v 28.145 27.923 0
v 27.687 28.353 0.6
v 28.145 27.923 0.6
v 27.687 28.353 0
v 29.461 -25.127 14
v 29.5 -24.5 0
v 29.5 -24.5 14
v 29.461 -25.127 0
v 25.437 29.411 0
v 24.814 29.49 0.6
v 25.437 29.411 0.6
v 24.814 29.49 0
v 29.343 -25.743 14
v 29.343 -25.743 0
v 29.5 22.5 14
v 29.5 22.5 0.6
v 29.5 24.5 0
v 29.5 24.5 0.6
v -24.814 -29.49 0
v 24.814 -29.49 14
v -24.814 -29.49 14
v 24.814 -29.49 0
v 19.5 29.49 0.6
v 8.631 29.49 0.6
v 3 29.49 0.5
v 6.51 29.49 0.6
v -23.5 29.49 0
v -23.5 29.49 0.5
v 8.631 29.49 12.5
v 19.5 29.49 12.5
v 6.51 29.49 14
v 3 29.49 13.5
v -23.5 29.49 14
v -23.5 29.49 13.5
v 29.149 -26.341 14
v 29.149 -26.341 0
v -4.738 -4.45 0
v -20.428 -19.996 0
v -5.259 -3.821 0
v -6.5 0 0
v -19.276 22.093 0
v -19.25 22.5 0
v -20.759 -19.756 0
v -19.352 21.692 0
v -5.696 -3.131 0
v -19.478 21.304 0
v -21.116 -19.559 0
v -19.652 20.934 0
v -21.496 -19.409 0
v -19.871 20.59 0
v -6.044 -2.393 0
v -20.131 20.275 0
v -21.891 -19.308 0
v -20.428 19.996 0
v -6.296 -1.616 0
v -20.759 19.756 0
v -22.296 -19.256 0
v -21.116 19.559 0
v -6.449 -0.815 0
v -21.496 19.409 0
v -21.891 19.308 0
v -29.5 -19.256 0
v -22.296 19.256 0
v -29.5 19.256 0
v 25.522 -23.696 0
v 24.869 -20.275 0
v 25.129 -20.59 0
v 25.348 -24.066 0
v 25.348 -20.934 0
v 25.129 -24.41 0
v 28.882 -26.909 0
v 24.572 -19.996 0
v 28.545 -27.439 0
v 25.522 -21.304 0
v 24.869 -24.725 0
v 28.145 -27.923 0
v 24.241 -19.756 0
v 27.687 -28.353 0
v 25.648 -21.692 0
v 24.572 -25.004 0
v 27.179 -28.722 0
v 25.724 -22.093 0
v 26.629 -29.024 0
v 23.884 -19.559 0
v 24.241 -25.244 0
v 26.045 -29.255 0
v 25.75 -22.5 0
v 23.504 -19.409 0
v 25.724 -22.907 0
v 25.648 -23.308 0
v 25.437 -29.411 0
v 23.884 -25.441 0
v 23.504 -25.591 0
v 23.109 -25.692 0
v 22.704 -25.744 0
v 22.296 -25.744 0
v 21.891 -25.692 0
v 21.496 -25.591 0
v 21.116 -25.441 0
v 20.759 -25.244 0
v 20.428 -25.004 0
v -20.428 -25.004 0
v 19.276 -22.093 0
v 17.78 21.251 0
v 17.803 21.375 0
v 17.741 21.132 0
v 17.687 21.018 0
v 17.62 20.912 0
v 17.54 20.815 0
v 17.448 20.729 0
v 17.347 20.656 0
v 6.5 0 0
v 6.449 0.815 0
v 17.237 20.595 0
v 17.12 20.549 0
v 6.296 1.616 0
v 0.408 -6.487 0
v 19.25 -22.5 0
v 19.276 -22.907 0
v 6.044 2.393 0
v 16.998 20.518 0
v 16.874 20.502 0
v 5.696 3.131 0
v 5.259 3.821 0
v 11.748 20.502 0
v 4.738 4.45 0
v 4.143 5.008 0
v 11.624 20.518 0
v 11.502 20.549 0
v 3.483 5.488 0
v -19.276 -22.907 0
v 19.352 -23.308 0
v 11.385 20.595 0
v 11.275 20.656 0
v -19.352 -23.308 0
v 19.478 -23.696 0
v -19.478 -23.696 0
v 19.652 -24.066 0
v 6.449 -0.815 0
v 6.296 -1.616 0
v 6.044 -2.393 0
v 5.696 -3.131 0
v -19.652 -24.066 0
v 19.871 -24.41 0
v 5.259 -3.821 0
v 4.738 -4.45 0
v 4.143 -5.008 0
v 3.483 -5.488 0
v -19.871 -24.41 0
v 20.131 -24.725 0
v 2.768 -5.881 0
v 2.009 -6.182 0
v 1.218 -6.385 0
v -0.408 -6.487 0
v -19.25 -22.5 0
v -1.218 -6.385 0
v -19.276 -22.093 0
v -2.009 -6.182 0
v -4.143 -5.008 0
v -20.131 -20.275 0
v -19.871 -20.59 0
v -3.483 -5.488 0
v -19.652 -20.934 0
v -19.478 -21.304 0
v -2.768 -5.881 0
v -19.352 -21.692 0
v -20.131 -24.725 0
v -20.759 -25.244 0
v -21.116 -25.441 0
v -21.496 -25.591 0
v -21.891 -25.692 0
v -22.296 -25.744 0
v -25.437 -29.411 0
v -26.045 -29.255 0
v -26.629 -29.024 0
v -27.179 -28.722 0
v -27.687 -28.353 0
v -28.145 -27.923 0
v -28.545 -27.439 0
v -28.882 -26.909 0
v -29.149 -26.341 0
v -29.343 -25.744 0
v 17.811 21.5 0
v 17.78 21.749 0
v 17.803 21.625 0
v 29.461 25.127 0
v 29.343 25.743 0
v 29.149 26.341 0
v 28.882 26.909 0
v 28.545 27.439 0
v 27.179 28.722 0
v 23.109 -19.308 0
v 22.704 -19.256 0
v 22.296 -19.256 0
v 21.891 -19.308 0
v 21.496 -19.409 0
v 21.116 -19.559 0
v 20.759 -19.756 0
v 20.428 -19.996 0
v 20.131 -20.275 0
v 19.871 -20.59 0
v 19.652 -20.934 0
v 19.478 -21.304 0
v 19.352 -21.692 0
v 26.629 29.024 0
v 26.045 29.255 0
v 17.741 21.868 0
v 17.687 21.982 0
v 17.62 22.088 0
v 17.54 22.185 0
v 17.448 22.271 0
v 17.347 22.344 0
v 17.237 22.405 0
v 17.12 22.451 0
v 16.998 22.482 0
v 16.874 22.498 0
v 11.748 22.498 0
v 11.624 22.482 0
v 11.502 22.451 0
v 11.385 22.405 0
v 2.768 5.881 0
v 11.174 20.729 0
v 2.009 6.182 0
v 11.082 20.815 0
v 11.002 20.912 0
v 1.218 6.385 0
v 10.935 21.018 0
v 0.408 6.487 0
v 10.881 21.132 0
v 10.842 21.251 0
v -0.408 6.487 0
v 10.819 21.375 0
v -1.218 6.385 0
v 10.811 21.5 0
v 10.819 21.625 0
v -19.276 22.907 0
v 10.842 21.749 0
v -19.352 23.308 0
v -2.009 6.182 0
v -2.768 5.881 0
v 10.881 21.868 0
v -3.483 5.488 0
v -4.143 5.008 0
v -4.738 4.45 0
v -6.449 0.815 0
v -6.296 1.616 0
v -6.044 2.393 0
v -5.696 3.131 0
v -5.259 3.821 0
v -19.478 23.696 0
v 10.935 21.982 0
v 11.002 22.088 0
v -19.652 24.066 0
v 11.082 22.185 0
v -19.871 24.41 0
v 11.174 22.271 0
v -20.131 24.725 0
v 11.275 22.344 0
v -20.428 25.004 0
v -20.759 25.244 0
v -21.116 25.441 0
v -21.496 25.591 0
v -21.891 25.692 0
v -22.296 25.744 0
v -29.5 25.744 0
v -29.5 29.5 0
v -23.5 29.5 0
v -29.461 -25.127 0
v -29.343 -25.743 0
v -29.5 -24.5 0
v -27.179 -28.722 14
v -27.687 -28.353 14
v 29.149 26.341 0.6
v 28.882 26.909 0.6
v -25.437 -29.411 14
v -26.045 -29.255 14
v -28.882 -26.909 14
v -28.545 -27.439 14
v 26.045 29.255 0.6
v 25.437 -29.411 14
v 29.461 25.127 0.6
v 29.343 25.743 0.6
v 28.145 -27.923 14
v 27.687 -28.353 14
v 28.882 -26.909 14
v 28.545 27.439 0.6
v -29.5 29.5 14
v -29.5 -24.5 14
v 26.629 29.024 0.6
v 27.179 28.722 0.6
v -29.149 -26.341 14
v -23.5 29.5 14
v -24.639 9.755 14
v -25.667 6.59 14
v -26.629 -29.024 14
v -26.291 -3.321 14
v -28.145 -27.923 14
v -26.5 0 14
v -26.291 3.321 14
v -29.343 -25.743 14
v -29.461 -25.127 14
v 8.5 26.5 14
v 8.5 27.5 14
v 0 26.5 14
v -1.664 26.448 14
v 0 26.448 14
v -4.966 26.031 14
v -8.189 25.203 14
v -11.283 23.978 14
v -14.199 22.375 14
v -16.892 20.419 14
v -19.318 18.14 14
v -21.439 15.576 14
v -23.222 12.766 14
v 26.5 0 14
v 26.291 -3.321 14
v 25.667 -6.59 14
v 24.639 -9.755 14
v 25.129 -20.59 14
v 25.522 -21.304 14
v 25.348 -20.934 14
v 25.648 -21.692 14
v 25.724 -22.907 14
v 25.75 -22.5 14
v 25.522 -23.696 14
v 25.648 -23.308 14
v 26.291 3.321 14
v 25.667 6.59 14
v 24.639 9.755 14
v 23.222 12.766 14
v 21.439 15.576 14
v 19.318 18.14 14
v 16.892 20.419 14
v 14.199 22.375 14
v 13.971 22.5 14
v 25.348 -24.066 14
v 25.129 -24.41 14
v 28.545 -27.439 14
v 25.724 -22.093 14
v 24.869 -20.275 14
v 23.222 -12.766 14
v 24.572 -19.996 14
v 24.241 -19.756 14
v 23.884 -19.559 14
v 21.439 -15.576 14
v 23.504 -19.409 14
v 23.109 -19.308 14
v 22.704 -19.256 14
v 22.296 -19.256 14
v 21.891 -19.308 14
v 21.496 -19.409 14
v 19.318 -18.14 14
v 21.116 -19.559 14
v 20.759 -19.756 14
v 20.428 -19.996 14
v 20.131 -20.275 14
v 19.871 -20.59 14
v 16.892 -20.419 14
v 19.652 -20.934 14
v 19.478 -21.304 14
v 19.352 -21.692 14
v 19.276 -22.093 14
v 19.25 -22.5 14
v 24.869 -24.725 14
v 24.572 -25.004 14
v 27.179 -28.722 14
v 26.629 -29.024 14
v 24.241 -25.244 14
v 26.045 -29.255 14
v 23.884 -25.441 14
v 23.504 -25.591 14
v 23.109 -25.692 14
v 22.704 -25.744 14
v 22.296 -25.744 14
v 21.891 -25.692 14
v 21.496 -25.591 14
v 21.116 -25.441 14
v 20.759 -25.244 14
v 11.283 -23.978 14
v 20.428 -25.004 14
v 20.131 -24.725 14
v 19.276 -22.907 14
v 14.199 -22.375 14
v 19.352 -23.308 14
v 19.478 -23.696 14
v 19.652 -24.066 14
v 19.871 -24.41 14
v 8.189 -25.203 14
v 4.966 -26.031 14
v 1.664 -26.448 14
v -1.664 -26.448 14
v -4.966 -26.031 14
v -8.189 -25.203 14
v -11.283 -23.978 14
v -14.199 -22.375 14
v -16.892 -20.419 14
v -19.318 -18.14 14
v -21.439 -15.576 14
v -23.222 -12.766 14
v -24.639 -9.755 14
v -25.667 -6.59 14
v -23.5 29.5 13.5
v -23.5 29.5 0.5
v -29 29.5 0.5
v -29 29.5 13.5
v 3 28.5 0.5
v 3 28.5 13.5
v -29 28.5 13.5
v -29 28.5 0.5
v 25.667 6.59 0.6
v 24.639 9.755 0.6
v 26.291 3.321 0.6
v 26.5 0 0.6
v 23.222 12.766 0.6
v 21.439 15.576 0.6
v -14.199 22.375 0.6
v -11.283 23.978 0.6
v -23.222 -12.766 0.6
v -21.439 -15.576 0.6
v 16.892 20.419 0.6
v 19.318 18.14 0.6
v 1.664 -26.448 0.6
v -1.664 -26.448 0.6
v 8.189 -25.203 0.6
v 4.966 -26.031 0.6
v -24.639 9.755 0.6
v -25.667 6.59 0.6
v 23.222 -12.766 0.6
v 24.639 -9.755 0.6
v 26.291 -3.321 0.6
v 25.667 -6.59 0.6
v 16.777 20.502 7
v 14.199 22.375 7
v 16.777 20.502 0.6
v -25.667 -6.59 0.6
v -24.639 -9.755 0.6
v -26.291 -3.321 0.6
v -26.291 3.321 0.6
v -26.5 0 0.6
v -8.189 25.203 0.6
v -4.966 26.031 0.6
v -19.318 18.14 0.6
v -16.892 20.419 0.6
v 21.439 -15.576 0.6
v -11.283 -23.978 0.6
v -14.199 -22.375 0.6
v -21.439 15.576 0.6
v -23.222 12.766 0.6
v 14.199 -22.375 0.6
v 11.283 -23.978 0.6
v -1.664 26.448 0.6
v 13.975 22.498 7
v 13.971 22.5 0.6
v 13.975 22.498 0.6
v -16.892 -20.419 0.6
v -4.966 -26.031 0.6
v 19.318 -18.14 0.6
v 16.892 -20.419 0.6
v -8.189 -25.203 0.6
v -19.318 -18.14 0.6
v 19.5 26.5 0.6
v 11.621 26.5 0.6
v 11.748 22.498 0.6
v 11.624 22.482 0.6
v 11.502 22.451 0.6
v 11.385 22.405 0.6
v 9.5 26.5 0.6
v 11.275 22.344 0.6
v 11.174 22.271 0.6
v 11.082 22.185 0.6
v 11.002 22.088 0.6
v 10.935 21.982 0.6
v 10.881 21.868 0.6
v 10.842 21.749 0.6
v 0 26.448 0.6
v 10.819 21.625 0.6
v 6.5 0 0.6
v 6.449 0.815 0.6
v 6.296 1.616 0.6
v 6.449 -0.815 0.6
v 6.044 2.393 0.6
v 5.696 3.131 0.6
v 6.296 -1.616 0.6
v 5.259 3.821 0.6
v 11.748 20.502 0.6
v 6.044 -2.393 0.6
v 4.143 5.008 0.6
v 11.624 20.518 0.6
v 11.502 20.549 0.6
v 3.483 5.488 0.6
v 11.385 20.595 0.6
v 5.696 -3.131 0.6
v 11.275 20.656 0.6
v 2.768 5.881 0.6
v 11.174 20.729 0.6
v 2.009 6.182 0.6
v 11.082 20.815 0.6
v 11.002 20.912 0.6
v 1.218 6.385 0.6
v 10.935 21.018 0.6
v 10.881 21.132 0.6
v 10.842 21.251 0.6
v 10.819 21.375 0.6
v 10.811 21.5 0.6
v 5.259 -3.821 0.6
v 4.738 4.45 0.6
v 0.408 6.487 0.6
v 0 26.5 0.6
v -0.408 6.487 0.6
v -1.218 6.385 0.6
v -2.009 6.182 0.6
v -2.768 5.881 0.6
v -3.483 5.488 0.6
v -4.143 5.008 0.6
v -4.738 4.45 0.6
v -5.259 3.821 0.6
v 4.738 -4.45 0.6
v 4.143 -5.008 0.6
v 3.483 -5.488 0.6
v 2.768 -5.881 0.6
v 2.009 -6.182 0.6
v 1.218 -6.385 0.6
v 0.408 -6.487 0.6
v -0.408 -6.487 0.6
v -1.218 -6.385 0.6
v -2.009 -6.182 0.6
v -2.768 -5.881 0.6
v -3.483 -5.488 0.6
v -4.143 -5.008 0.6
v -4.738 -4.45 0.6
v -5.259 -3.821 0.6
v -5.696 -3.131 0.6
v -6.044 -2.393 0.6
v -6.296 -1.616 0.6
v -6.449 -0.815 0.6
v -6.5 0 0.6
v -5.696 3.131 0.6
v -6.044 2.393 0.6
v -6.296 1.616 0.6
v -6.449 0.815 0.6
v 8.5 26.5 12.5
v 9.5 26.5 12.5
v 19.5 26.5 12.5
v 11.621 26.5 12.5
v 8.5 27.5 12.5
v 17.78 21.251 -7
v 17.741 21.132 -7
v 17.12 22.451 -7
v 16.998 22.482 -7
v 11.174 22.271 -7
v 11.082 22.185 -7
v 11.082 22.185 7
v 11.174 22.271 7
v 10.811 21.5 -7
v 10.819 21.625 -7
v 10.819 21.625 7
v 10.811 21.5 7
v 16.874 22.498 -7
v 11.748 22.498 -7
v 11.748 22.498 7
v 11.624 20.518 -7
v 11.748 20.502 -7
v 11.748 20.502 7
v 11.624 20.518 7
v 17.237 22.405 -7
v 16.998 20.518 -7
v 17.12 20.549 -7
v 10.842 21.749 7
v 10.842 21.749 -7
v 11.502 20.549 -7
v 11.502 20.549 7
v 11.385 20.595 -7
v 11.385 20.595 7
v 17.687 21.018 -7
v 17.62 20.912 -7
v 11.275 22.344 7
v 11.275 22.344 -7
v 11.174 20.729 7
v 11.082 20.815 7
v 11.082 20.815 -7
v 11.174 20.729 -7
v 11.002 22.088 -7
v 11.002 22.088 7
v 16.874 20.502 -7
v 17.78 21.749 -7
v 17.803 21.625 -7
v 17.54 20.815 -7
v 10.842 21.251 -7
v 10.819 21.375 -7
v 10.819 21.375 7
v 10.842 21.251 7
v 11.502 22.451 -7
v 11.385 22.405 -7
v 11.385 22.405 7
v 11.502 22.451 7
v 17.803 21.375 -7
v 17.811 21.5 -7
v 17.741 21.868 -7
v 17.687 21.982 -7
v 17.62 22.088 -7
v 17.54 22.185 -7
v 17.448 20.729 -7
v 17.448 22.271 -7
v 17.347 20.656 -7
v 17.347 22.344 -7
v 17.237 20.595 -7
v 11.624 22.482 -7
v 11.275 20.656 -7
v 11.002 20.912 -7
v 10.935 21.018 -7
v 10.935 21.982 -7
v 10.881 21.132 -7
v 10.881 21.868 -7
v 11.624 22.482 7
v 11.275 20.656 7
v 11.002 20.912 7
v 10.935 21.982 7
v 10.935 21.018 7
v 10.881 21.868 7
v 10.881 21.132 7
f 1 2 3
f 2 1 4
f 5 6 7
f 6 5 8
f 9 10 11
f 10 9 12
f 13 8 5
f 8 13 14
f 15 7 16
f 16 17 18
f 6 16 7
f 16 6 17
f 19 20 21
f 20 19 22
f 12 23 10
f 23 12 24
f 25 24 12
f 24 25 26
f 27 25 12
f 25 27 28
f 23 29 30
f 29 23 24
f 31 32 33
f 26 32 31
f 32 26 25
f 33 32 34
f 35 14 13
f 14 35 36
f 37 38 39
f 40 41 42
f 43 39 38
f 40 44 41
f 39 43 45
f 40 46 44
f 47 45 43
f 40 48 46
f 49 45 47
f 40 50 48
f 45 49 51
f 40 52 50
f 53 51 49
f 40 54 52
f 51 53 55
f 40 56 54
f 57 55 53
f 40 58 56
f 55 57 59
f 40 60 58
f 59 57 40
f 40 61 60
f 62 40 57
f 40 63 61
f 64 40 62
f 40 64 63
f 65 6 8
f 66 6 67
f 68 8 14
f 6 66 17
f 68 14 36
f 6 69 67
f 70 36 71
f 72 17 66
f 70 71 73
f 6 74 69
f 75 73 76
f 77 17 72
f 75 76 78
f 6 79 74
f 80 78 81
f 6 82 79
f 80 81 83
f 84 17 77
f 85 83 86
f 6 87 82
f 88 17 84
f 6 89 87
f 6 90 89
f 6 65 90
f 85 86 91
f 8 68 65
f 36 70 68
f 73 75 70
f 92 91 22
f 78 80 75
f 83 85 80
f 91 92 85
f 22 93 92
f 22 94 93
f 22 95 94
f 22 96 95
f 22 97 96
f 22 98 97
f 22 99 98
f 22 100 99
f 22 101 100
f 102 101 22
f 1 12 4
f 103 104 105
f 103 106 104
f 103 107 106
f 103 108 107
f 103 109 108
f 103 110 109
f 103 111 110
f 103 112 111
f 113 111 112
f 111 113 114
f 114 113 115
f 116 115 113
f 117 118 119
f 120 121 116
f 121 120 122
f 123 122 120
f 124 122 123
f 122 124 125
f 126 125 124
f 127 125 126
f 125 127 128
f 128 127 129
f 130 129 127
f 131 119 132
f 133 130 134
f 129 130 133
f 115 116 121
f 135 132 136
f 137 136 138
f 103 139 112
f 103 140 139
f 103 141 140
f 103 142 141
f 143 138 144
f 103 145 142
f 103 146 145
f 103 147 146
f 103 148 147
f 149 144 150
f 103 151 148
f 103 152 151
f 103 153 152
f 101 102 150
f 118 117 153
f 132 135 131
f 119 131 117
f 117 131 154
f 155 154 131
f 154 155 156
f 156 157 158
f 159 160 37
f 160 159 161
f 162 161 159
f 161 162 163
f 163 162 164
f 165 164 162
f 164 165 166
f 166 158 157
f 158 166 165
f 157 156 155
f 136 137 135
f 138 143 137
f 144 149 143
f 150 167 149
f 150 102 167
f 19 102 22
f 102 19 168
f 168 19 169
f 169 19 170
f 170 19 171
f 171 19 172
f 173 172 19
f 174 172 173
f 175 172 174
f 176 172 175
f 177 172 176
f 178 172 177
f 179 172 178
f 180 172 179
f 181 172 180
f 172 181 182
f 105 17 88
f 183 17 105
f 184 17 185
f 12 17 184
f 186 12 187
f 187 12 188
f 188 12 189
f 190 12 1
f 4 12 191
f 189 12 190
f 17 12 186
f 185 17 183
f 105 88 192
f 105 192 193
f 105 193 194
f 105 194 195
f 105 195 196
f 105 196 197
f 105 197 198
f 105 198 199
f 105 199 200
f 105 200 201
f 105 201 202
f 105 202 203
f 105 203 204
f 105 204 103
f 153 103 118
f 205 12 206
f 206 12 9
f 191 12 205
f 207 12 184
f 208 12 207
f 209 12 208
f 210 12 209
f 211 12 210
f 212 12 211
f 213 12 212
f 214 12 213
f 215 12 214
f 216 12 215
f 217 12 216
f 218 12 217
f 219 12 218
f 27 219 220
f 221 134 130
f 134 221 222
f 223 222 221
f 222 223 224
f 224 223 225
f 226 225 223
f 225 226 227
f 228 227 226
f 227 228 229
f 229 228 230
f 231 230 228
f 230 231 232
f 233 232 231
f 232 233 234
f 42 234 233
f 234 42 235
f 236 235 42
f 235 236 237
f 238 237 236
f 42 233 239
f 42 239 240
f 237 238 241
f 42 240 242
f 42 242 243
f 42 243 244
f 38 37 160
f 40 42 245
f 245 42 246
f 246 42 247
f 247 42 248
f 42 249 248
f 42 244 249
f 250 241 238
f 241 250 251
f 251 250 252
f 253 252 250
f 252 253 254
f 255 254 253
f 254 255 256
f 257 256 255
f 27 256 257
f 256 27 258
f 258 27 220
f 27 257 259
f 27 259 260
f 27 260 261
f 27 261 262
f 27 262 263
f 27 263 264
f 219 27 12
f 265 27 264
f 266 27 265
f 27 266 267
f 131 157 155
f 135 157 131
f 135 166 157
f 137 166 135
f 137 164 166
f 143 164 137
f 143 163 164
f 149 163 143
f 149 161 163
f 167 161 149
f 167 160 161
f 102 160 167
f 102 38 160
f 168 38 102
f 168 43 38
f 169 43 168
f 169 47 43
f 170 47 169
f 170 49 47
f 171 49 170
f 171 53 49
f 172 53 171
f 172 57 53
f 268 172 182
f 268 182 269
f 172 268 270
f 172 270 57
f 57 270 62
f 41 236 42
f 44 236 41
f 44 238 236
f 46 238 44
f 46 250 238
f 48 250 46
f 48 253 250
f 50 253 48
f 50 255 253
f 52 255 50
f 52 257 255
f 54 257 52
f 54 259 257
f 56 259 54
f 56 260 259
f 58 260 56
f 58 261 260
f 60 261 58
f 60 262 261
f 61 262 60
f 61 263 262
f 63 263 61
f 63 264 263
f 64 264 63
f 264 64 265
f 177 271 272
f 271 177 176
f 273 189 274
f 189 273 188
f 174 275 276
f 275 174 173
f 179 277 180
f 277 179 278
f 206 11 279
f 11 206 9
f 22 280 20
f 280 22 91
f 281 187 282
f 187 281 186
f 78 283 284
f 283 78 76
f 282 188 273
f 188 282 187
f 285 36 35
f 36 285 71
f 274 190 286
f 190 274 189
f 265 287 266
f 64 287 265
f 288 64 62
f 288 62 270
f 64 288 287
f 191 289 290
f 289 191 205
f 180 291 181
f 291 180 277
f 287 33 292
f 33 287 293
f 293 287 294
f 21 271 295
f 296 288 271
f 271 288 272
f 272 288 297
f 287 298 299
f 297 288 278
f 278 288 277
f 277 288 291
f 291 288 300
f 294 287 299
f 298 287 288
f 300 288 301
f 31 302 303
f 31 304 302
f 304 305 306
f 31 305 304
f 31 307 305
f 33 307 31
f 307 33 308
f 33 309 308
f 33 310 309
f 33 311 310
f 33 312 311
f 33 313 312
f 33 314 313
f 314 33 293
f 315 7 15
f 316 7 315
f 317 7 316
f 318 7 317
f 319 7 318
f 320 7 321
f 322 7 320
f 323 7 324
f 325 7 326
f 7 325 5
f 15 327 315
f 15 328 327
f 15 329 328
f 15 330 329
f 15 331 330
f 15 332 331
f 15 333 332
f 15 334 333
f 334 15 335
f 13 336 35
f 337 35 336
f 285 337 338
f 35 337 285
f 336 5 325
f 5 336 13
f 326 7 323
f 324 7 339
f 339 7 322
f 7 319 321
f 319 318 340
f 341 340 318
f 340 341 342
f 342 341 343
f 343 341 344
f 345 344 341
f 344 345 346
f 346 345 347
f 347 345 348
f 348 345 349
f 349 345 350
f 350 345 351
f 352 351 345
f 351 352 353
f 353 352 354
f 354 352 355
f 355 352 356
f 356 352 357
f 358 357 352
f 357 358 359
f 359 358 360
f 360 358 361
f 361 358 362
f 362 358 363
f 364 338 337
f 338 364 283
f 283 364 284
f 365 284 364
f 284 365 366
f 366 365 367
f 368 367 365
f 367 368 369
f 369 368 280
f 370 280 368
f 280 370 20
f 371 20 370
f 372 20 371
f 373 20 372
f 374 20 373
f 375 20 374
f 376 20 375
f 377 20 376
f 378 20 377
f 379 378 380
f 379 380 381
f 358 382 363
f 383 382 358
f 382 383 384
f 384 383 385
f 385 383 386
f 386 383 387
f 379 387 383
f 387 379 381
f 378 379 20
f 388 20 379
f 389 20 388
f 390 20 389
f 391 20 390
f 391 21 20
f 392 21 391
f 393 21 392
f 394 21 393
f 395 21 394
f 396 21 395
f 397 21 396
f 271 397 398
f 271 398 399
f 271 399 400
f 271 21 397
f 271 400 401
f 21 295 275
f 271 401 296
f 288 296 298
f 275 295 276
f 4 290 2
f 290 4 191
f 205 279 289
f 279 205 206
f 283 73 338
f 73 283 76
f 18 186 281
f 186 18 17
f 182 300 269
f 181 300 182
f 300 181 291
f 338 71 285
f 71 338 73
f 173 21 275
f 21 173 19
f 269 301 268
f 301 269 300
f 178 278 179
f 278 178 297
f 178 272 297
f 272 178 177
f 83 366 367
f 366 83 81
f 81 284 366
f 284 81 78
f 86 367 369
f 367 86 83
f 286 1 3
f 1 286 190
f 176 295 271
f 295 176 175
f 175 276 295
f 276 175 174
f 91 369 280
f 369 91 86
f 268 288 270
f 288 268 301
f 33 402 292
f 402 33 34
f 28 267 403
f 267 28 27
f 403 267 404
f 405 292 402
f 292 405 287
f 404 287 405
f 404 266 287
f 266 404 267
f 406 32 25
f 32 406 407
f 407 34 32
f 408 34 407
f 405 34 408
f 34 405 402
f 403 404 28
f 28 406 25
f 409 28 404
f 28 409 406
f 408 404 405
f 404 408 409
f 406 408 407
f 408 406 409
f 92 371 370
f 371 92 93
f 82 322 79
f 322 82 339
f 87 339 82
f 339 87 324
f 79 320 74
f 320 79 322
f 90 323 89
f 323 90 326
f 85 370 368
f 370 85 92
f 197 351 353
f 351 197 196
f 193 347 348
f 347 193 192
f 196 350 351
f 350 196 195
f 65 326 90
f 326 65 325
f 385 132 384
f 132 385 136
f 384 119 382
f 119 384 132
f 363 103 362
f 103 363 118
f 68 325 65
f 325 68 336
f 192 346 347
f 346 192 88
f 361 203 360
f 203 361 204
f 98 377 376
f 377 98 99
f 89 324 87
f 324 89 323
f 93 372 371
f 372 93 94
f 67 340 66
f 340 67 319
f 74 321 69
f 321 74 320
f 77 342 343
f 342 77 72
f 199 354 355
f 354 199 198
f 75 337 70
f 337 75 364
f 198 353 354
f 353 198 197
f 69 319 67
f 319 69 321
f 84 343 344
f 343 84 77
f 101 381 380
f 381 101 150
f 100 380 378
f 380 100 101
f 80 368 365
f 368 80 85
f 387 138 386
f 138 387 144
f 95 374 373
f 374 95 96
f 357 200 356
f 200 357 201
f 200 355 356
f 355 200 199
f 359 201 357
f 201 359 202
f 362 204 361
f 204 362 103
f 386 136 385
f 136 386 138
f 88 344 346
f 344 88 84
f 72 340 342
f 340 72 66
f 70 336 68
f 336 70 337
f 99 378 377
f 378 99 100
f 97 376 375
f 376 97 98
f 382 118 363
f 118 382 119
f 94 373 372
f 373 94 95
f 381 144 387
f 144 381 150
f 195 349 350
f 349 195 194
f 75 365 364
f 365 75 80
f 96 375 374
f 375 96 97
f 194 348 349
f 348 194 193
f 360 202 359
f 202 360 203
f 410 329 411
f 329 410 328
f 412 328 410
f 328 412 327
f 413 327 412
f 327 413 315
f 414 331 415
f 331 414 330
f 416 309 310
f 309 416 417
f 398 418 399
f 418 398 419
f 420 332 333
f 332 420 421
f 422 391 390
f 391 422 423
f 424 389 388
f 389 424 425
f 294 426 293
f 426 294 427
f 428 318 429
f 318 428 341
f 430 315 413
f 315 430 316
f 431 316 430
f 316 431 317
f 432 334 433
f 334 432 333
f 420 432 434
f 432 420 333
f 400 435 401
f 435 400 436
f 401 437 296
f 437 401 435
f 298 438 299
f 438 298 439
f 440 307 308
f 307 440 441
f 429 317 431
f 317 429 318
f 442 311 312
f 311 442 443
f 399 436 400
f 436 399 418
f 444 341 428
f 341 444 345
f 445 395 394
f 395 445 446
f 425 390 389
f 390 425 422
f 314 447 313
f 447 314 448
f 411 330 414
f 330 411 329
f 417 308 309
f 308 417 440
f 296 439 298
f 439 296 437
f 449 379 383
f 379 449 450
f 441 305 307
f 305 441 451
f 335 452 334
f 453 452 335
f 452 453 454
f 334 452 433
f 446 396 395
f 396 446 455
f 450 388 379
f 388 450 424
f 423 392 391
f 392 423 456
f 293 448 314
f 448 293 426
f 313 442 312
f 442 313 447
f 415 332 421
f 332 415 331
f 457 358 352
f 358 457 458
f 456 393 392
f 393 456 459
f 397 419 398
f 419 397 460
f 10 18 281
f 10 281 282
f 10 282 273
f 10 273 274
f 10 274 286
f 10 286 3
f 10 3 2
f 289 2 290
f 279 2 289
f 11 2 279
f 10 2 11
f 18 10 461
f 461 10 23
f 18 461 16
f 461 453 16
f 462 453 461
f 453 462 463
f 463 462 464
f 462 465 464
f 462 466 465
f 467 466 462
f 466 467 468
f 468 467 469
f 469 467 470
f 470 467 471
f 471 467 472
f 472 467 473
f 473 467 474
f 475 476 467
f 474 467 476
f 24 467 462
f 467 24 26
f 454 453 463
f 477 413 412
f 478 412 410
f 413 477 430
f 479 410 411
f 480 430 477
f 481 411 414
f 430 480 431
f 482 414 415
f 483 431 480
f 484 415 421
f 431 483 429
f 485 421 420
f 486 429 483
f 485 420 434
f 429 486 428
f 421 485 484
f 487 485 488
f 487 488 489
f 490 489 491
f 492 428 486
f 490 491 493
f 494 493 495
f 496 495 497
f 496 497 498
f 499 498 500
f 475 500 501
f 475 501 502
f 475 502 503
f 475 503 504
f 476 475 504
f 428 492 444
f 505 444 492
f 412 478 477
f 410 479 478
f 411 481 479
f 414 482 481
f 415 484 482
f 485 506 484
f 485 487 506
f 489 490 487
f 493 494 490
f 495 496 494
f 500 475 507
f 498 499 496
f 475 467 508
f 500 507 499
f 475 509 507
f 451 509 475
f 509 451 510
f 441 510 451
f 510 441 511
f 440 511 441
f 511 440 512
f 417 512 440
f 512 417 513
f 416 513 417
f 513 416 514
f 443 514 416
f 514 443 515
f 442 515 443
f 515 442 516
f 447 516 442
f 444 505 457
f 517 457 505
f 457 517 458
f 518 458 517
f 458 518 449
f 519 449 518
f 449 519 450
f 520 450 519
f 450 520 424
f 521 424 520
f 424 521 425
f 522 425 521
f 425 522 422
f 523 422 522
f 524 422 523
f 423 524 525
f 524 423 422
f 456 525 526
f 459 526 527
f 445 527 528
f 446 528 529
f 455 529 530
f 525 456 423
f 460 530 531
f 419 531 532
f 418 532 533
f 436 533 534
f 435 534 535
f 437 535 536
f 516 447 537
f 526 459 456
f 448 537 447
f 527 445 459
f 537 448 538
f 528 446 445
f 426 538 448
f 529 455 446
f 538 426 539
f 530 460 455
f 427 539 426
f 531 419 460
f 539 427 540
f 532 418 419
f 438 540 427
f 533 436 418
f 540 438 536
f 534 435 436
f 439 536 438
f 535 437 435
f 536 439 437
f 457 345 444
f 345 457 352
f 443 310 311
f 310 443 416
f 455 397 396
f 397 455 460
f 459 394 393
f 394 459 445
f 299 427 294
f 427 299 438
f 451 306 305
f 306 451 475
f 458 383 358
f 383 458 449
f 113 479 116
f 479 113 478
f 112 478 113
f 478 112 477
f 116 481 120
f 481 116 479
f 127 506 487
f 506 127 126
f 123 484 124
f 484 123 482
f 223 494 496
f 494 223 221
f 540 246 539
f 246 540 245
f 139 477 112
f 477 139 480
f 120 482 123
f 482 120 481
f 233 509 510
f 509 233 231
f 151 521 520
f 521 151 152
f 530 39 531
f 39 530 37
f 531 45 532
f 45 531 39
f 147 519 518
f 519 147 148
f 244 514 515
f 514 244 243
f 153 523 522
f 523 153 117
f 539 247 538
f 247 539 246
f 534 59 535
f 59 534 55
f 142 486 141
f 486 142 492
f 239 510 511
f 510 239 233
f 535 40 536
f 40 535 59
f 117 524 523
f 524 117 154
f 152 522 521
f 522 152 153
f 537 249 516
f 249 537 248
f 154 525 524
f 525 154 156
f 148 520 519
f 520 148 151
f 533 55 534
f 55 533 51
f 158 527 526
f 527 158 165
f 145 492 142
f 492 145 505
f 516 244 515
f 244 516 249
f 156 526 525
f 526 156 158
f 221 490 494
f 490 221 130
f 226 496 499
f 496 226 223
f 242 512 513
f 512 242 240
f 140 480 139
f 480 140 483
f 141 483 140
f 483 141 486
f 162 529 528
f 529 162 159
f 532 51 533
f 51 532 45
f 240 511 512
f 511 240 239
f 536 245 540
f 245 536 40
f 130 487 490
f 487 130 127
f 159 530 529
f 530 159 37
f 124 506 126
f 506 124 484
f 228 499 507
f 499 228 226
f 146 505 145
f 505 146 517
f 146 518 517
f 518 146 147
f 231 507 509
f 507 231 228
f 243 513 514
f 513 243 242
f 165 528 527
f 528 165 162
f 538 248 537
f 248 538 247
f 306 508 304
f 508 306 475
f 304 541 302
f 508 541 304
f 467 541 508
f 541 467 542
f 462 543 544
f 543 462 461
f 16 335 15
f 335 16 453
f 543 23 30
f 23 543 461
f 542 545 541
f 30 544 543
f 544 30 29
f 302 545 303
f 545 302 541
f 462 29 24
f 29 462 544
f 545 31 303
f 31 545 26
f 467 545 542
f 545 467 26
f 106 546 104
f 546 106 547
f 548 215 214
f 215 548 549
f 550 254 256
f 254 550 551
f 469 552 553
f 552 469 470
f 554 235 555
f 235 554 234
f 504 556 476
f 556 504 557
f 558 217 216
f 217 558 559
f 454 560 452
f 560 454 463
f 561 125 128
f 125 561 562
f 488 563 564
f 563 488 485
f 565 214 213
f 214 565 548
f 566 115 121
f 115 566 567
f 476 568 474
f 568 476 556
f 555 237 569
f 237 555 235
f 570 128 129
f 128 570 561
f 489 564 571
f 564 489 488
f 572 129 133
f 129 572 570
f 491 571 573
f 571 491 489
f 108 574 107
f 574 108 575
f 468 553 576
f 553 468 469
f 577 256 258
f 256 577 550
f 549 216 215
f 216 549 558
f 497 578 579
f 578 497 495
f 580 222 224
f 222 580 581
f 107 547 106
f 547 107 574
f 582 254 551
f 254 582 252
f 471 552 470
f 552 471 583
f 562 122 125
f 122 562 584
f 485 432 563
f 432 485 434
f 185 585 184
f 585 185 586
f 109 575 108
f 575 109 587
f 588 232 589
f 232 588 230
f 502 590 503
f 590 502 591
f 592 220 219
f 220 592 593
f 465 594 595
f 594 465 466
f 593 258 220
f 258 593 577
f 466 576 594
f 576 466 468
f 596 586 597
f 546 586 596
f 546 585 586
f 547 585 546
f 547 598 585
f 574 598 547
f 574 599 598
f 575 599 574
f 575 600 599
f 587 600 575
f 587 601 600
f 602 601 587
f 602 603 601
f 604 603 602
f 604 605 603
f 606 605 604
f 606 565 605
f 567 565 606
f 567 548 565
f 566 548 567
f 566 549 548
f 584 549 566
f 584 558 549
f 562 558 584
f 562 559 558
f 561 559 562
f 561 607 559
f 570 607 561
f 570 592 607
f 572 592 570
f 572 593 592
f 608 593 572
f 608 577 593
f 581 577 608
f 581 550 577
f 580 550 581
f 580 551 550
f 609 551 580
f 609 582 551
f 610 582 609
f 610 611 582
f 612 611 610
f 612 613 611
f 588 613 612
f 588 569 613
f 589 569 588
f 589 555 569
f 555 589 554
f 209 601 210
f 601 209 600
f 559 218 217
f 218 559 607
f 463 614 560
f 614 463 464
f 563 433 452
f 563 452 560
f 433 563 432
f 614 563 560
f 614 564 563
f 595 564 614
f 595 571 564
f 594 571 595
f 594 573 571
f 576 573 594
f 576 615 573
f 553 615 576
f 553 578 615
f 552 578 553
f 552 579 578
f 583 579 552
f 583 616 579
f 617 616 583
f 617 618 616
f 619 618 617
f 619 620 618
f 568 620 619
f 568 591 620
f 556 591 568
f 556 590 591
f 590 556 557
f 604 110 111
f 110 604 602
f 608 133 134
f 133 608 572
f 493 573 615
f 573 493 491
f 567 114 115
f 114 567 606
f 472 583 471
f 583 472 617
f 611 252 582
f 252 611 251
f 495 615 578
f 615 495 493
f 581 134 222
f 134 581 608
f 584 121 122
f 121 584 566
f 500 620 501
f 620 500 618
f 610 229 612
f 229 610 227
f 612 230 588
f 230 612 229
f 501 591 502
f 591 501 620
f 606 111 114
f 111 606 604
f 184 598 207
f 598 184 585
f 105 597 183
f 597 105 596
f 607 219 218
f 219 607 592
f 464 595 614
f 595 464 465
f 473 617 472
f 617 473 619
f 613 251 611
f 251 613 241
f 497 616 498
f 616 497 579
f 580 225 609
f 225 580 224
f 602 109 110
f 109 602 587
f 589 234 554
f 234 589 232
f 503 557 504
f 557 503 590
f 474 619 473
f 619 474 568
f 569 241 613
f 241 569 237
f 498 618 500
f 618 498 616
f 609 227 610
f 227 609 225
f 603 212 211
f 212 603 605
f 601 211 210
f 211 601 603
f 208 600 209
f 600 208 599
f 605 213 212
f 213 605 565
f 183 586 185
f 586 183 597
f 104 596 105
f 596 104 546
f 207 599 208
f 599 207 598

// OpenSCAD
$fn = 50;


union() {
	difference() {
		union() {
			hull() {
				translate(v = [-24.5000000000, 24.5000000000, 0]) {
					cylinder(h = 14, r = 5);
				}
				translate(v = [24.5000000000, 24.5000000000, 0]) {
					cylinder(h = 14, r = 5);
				}
				translate(v = [-24.5000000000, -24.5000000000, 0]) {
					cylinder(h = 14, r = 5);
				}
				translate(v = [24.5000000000, -24.5000000000, 0]) {
					cylinder(h = 14, r = 5);
				}
			}
			translate(v = [-29.5000000000, 23.5000000000, 0]) {
				cube(size = [6, 6, 14]);
			}
		}
		union() {
			translate(v = [-30.0000000000, -22.5000000000, -250.0000000000]) {
				rotate(a = [0, 0, 0]) {
					difference() {
						union() {
							hull() {
								translate(v = [7.5000000000, 0, 0]) {
									cylinder(h = 250, r = 3.2500000000, r1 = 3.2500000000, r2 = 3.2500000000);
								}
								translate(v = [-7.5000000000, 0, 0]) {
									cylinder(h = 250, r = 3.2500000000, r1 = 3.2500000000, r2 = 3.2500000000);
								}
							}
						}
						union();
					}
				}
			}
			translate(v = [-30.0000000000, 22.5000000000, -250.0000000000]) {
				rotate(a = [0, 0, 0]) {
					difference() {
						union() {
							hull() {
								translate(v = [7.5000000000, 0, 0]) {
									cylinder(h = 250, r = 3.2500000000, r1 = 3.2500000000, r2 = 3.2500000000);
								}
								translate(v = [-7.5000000000, 0, 0]) {
									cylinder(h = 250, r = 3.2500000000, r1 = 3.2500000000, r2 = 3.2500000000);
								}
							}
						}
						union();
					}
				}
			}
			translate(v = [-29.0000000000, 28.5000000000, 0.5000000000]) {
				cube(size = [32, 1, 13.0000000000]);
			}
			translate(v = [22.5000000000, -22.5000000000, 0]) {
				cylinder(h = 100, r = 3.2500000000);
			}
			translate(v = [0, 0, 0.6000000000]) {
				cylinder(h = 16.4000000000, r = 26.5000000000);
			}
			translate(v = [0, 0, -7.0000000000]) {
				cylinder(h = 14, r = 6.5000000000);
			}
			translate(v = [0.0000000000, 22.5000000000, 0.6000000000]) {
				cube(size = [29.5000000000, 4, 16.4000000000]);
			}
			translate(v = [19.5000000000, 22.5000000000, 0.6000000000]) {
				cube(size = [10, 7, 16.4000000000]);
			}
			translate(v = [8.5000000000, 22.5000000000, 12.5000000000]) {
				cube(size = [21, 7, 1.5000000000]);
			}
			translate(v = [5.7500000000, 30.2500000000, 0.6000000000]) {
				rotate(a = [0, 0, -45]) {
					cube(size = [7.5000000000, 1.5000000000, 16.4000000000]);
				}
			}
			translate(v = [5.0610000000, 20.5000000000, 0.6000000000]) {
				cube(size = [7.5000000000, 2, 13.4000000000]);
			}
		}
	}
	union() {
		translate(v = [14.3110000000, 21.5000000000, -7.0000000000]) {
			rotate(a = [0, 0, 0]) {
				difference() {
					union() {
						#hull() {
							#translate(v = [2.5000000000, 0, 0]) {
								cylinder(h = 14, r = 1.0000000000, r1 = 1.0000000000, r2 = 1.0000000000);
							}
							#translate(v = [-2.5000000000, 0, 0]) {
								cylinder(h = 14, r = 1.0000000000, r1 = 1.0000000000, r2 = 1.0000000000);
							}
						}
					}
					union();
				}
			}
		}
	}
}
